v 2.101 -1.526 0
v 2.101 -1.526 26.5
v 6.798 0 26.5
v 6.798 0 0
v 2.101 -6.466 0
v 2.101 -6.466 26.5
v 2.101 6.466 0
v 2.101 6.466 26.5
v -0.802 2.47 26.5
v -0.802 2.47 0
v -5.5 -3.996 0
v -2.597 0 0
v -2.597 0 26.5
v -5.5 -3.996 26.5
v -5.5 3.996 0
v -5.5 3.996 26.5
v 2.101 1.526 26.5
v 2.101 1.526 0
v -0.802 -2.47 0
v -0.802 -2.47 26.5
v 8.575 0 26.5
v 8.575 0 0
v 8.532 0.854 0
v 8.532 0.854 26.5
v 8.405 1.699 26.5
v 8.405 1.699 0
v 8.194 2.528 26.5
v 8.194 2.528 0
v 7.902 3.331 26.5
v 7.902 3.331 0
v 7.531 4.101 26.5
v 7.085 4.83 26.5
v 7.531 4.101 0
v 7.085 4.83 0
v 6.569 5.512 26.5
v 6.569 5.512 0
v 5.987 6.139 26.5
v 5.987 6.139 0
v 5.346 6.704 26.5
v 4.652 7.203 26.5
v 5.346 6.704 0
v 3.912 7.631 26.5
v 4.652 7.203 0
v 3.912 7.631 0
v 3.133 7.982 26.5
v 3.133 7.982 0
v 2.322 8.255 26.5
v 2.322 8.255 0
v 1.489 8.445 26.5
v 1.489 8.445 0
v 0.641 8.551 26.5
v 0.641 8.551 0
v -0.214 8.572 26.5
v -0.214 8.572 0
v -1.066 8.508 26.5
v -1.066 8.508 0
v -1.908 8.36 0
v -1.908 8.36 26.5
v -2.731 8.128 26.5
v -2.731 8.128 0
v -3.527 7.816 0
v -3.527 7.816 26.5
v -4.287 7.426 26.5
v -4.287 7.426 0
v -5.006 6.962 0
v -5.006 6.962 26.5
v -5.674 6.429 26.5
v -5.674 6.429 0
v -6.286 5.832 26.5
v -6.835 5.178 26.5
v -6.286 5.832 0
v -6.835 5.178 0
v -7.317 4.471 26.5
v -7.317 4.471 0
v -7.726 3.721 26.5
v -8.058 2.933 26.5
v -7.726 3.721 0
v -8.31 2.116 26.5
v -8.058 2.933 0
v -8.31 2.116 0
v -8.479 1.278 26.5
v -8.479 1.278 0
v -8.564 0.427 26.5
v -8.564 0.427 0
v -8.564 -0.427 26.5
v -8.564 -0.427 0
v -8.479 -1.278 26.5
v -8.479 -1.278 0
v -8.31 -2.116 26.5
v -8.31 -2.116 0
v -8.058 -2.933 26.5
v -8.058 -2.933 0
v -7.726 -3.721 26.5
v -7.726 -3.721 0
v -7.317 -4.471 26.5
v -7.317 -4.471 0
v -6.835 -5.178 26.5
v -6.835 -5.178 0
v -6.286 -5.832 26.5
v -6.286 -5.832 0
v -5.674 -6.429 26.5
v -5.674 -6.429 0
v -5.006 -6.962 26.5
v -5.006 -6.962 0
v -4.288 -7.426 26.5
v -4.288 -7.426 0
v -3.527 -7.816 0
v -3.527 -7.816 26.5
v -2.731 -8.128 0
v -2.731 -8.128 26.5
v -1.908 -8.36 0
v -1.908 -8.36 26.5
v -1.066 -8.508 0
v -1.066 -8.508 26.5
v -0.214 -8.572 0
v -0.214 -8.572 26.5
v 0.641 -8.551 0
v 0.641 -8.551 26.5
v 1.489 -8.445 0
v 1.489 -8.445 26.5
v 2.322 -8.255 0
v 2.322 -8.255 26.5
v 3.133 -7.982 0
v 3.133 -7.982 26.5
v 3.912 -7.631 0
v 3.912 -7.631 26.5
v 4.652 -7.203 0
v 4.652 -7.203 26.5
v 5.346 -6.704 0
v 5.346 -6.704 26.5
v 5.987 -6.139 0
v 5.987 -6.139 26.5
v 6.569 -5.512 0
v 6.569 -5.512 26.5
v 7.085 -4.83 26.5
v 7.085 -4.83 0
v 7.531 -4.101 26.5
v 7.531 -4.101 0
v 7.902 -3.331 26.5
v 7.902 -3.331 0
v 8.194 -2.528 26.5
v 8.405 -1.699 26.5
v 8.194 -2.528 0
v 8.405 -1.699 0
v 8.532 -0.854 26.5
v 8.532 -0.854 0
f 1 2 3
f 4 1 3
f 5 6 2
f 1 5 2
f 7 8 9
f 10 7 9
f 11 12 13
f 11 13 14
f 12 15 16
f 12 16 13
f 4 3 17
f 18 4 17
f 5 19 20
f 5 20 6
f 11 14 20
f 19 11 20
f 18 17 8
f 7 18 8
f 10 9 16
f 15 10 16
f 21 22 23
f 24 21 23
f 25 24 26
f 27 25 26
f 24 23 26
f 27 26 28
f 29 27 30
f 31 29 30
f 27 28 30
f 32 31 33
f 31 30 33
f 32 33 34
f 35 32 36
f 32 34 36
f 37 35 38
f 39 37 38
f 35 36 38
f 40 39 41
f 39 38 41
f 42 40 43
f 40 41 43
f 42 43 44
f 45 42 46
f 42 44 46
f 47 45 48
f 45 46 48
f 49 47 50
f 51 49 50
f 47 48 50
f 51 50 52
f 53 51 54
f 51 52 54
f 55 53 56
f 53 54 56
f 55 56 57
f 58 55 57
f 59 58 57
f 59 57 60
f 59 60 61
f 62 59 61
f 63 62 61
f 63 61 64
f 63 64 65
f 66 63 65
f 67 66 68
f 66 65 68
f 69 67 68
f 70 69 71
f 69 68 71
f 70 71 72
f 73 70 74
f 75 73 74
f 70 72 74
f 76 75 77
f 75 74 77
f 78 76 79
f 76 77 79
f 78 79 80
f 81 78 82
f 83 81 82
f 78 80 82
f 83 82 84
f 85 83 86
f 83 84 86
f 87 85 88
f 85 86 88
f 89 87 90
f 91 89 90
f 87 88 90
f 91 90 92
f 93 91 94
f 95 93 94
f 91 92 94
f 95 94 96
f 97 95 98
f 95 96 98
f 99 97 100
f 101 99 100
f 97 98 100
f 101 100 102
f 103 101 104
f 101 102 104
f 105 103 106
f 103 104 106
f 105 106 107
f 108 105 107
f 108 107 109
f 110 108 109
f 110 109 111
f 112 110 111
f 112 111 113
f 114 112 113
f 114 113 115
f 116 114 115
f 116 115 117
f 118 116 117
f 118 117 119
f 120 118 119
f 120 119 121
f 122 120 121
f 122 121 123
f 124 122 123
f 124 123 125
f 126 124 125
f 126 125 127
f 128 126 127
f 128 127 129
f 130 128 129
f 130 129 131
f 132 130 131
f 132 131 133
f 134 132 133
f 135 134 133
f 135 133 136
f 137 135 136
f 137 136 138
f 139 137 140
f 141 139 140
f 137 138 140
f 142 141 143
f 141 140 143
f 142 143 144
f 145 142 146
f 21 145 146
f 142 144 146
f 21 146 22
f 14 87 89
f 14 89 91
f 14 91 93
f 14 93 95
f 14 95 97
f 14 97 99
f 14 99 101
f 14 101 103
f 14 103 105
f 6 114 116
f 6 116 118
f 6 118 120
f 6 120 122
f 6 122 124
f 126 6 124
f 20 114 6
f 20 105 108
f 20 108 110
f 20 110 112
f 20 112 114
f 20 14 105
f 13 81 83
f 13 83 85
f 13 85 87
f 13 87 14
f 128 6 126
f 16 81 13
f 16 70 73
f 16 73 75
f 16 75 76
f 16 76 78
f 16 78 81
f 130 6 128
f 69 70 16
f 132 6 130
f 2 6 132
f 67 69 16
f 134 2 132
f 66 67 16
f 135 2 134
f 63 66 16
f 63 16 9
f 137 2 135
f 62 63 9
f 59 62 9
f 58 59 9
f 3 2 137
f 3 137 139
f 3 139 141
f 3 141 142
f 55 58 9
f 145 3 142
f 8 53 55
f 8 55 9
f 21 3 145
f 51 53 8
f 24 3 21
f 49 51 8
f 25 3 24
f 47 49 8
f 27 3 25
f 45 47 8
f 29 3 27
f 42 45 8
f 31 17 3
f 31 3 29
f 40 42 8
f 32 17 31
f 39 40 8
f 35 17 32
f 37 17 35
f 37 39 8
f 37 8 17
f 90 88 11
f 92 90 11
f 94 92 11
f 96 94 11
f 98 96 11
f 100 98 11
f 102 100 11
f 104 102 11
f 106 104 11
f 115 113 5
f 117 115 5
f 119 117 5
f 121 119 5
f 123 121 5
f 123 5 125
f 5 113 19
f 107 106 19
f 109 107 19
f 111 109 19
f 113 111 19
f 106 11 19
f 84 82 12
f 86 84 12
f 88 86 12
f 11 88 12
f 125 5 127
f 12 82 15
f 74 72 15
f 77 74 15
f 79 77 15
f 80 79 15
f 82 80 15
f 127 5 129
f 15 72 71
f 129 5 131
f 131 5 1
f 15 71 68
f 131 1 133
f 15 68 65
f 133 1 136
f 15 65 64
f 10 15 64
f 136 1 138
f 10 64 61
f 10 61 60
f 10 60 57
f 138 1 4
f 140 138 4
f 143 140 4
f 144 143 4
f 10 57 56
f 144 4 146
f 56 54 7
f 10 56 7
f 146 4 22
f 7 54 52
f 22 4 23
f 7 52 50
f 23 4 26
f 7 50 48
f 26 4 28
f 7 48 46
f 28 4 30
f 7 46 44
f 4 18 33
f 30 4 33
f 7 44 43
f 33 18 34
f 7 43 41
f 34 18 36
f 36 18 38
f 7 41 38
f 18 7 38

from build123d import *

# Parameters (mm, degrees)
F0_R     = 8.575
F1_DEPTH = 26.5
F3_DEPTH = 26.5


with BuildPart() as f1:
    # F0 (on Top) → F1 (new body)
    with BuildSketch(Plane.XY):
        Circle(F0_R)
    extrude(amount=F1_DEPTH)

    # F2 (on face) → F3 (cut)
    with BuildSketch(Plane.XY.offset(26.5)):
        Polygon((-0.8024391856, 2.4696538712), (-5.5, 3.995983904), (-2.5967477525, 0), align=None)
        Polygon((2.1008130619, 6.4656377752), (-0.8024391856, 2.4696538712), (2.1008130619, 1.5263300328), align=None)
        Polygon((-0.8024391856, 2.4696538712), (-2.5967477525, 0), (-0.8024391856, -2.4696538712), (2.1008130619, -1.5263300328), (2.1008130619, 1.5263300328), align=None)
        Polygon((-0.8024391856, -2.4696538712), (-2.5967477525, 0), (-5.5, -3.995983904), align=None)
        Polygon((2.1008130619, -1.5263300328), (-0.8024391856, -2.4696538712), (2.1008130619, -6.4656377752), align=None)
        Polygon((6.7983738762, 0), (2.1008130619, 1.5263300328), (2.1008130619, -1.5263300328), align=None)
    extrude(amount=-F3_DEPTH, mode=Mode.SUBTRACT)


solid = f1.part
